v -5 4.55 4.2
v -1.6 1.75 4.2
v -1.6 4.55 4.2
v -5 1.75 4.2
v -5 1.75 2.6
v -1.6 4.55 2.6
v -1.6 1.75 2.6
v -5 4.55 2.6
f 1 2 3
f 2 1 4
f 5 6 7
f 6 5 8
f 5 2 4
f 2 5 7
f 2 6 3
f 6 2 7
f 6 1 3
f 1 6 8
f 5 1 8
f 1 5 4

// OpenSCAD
union() {
  translate([-5.0, 1.75, 2.6]) cube(size=[3.4,2.8,1.6], center=false);
}
